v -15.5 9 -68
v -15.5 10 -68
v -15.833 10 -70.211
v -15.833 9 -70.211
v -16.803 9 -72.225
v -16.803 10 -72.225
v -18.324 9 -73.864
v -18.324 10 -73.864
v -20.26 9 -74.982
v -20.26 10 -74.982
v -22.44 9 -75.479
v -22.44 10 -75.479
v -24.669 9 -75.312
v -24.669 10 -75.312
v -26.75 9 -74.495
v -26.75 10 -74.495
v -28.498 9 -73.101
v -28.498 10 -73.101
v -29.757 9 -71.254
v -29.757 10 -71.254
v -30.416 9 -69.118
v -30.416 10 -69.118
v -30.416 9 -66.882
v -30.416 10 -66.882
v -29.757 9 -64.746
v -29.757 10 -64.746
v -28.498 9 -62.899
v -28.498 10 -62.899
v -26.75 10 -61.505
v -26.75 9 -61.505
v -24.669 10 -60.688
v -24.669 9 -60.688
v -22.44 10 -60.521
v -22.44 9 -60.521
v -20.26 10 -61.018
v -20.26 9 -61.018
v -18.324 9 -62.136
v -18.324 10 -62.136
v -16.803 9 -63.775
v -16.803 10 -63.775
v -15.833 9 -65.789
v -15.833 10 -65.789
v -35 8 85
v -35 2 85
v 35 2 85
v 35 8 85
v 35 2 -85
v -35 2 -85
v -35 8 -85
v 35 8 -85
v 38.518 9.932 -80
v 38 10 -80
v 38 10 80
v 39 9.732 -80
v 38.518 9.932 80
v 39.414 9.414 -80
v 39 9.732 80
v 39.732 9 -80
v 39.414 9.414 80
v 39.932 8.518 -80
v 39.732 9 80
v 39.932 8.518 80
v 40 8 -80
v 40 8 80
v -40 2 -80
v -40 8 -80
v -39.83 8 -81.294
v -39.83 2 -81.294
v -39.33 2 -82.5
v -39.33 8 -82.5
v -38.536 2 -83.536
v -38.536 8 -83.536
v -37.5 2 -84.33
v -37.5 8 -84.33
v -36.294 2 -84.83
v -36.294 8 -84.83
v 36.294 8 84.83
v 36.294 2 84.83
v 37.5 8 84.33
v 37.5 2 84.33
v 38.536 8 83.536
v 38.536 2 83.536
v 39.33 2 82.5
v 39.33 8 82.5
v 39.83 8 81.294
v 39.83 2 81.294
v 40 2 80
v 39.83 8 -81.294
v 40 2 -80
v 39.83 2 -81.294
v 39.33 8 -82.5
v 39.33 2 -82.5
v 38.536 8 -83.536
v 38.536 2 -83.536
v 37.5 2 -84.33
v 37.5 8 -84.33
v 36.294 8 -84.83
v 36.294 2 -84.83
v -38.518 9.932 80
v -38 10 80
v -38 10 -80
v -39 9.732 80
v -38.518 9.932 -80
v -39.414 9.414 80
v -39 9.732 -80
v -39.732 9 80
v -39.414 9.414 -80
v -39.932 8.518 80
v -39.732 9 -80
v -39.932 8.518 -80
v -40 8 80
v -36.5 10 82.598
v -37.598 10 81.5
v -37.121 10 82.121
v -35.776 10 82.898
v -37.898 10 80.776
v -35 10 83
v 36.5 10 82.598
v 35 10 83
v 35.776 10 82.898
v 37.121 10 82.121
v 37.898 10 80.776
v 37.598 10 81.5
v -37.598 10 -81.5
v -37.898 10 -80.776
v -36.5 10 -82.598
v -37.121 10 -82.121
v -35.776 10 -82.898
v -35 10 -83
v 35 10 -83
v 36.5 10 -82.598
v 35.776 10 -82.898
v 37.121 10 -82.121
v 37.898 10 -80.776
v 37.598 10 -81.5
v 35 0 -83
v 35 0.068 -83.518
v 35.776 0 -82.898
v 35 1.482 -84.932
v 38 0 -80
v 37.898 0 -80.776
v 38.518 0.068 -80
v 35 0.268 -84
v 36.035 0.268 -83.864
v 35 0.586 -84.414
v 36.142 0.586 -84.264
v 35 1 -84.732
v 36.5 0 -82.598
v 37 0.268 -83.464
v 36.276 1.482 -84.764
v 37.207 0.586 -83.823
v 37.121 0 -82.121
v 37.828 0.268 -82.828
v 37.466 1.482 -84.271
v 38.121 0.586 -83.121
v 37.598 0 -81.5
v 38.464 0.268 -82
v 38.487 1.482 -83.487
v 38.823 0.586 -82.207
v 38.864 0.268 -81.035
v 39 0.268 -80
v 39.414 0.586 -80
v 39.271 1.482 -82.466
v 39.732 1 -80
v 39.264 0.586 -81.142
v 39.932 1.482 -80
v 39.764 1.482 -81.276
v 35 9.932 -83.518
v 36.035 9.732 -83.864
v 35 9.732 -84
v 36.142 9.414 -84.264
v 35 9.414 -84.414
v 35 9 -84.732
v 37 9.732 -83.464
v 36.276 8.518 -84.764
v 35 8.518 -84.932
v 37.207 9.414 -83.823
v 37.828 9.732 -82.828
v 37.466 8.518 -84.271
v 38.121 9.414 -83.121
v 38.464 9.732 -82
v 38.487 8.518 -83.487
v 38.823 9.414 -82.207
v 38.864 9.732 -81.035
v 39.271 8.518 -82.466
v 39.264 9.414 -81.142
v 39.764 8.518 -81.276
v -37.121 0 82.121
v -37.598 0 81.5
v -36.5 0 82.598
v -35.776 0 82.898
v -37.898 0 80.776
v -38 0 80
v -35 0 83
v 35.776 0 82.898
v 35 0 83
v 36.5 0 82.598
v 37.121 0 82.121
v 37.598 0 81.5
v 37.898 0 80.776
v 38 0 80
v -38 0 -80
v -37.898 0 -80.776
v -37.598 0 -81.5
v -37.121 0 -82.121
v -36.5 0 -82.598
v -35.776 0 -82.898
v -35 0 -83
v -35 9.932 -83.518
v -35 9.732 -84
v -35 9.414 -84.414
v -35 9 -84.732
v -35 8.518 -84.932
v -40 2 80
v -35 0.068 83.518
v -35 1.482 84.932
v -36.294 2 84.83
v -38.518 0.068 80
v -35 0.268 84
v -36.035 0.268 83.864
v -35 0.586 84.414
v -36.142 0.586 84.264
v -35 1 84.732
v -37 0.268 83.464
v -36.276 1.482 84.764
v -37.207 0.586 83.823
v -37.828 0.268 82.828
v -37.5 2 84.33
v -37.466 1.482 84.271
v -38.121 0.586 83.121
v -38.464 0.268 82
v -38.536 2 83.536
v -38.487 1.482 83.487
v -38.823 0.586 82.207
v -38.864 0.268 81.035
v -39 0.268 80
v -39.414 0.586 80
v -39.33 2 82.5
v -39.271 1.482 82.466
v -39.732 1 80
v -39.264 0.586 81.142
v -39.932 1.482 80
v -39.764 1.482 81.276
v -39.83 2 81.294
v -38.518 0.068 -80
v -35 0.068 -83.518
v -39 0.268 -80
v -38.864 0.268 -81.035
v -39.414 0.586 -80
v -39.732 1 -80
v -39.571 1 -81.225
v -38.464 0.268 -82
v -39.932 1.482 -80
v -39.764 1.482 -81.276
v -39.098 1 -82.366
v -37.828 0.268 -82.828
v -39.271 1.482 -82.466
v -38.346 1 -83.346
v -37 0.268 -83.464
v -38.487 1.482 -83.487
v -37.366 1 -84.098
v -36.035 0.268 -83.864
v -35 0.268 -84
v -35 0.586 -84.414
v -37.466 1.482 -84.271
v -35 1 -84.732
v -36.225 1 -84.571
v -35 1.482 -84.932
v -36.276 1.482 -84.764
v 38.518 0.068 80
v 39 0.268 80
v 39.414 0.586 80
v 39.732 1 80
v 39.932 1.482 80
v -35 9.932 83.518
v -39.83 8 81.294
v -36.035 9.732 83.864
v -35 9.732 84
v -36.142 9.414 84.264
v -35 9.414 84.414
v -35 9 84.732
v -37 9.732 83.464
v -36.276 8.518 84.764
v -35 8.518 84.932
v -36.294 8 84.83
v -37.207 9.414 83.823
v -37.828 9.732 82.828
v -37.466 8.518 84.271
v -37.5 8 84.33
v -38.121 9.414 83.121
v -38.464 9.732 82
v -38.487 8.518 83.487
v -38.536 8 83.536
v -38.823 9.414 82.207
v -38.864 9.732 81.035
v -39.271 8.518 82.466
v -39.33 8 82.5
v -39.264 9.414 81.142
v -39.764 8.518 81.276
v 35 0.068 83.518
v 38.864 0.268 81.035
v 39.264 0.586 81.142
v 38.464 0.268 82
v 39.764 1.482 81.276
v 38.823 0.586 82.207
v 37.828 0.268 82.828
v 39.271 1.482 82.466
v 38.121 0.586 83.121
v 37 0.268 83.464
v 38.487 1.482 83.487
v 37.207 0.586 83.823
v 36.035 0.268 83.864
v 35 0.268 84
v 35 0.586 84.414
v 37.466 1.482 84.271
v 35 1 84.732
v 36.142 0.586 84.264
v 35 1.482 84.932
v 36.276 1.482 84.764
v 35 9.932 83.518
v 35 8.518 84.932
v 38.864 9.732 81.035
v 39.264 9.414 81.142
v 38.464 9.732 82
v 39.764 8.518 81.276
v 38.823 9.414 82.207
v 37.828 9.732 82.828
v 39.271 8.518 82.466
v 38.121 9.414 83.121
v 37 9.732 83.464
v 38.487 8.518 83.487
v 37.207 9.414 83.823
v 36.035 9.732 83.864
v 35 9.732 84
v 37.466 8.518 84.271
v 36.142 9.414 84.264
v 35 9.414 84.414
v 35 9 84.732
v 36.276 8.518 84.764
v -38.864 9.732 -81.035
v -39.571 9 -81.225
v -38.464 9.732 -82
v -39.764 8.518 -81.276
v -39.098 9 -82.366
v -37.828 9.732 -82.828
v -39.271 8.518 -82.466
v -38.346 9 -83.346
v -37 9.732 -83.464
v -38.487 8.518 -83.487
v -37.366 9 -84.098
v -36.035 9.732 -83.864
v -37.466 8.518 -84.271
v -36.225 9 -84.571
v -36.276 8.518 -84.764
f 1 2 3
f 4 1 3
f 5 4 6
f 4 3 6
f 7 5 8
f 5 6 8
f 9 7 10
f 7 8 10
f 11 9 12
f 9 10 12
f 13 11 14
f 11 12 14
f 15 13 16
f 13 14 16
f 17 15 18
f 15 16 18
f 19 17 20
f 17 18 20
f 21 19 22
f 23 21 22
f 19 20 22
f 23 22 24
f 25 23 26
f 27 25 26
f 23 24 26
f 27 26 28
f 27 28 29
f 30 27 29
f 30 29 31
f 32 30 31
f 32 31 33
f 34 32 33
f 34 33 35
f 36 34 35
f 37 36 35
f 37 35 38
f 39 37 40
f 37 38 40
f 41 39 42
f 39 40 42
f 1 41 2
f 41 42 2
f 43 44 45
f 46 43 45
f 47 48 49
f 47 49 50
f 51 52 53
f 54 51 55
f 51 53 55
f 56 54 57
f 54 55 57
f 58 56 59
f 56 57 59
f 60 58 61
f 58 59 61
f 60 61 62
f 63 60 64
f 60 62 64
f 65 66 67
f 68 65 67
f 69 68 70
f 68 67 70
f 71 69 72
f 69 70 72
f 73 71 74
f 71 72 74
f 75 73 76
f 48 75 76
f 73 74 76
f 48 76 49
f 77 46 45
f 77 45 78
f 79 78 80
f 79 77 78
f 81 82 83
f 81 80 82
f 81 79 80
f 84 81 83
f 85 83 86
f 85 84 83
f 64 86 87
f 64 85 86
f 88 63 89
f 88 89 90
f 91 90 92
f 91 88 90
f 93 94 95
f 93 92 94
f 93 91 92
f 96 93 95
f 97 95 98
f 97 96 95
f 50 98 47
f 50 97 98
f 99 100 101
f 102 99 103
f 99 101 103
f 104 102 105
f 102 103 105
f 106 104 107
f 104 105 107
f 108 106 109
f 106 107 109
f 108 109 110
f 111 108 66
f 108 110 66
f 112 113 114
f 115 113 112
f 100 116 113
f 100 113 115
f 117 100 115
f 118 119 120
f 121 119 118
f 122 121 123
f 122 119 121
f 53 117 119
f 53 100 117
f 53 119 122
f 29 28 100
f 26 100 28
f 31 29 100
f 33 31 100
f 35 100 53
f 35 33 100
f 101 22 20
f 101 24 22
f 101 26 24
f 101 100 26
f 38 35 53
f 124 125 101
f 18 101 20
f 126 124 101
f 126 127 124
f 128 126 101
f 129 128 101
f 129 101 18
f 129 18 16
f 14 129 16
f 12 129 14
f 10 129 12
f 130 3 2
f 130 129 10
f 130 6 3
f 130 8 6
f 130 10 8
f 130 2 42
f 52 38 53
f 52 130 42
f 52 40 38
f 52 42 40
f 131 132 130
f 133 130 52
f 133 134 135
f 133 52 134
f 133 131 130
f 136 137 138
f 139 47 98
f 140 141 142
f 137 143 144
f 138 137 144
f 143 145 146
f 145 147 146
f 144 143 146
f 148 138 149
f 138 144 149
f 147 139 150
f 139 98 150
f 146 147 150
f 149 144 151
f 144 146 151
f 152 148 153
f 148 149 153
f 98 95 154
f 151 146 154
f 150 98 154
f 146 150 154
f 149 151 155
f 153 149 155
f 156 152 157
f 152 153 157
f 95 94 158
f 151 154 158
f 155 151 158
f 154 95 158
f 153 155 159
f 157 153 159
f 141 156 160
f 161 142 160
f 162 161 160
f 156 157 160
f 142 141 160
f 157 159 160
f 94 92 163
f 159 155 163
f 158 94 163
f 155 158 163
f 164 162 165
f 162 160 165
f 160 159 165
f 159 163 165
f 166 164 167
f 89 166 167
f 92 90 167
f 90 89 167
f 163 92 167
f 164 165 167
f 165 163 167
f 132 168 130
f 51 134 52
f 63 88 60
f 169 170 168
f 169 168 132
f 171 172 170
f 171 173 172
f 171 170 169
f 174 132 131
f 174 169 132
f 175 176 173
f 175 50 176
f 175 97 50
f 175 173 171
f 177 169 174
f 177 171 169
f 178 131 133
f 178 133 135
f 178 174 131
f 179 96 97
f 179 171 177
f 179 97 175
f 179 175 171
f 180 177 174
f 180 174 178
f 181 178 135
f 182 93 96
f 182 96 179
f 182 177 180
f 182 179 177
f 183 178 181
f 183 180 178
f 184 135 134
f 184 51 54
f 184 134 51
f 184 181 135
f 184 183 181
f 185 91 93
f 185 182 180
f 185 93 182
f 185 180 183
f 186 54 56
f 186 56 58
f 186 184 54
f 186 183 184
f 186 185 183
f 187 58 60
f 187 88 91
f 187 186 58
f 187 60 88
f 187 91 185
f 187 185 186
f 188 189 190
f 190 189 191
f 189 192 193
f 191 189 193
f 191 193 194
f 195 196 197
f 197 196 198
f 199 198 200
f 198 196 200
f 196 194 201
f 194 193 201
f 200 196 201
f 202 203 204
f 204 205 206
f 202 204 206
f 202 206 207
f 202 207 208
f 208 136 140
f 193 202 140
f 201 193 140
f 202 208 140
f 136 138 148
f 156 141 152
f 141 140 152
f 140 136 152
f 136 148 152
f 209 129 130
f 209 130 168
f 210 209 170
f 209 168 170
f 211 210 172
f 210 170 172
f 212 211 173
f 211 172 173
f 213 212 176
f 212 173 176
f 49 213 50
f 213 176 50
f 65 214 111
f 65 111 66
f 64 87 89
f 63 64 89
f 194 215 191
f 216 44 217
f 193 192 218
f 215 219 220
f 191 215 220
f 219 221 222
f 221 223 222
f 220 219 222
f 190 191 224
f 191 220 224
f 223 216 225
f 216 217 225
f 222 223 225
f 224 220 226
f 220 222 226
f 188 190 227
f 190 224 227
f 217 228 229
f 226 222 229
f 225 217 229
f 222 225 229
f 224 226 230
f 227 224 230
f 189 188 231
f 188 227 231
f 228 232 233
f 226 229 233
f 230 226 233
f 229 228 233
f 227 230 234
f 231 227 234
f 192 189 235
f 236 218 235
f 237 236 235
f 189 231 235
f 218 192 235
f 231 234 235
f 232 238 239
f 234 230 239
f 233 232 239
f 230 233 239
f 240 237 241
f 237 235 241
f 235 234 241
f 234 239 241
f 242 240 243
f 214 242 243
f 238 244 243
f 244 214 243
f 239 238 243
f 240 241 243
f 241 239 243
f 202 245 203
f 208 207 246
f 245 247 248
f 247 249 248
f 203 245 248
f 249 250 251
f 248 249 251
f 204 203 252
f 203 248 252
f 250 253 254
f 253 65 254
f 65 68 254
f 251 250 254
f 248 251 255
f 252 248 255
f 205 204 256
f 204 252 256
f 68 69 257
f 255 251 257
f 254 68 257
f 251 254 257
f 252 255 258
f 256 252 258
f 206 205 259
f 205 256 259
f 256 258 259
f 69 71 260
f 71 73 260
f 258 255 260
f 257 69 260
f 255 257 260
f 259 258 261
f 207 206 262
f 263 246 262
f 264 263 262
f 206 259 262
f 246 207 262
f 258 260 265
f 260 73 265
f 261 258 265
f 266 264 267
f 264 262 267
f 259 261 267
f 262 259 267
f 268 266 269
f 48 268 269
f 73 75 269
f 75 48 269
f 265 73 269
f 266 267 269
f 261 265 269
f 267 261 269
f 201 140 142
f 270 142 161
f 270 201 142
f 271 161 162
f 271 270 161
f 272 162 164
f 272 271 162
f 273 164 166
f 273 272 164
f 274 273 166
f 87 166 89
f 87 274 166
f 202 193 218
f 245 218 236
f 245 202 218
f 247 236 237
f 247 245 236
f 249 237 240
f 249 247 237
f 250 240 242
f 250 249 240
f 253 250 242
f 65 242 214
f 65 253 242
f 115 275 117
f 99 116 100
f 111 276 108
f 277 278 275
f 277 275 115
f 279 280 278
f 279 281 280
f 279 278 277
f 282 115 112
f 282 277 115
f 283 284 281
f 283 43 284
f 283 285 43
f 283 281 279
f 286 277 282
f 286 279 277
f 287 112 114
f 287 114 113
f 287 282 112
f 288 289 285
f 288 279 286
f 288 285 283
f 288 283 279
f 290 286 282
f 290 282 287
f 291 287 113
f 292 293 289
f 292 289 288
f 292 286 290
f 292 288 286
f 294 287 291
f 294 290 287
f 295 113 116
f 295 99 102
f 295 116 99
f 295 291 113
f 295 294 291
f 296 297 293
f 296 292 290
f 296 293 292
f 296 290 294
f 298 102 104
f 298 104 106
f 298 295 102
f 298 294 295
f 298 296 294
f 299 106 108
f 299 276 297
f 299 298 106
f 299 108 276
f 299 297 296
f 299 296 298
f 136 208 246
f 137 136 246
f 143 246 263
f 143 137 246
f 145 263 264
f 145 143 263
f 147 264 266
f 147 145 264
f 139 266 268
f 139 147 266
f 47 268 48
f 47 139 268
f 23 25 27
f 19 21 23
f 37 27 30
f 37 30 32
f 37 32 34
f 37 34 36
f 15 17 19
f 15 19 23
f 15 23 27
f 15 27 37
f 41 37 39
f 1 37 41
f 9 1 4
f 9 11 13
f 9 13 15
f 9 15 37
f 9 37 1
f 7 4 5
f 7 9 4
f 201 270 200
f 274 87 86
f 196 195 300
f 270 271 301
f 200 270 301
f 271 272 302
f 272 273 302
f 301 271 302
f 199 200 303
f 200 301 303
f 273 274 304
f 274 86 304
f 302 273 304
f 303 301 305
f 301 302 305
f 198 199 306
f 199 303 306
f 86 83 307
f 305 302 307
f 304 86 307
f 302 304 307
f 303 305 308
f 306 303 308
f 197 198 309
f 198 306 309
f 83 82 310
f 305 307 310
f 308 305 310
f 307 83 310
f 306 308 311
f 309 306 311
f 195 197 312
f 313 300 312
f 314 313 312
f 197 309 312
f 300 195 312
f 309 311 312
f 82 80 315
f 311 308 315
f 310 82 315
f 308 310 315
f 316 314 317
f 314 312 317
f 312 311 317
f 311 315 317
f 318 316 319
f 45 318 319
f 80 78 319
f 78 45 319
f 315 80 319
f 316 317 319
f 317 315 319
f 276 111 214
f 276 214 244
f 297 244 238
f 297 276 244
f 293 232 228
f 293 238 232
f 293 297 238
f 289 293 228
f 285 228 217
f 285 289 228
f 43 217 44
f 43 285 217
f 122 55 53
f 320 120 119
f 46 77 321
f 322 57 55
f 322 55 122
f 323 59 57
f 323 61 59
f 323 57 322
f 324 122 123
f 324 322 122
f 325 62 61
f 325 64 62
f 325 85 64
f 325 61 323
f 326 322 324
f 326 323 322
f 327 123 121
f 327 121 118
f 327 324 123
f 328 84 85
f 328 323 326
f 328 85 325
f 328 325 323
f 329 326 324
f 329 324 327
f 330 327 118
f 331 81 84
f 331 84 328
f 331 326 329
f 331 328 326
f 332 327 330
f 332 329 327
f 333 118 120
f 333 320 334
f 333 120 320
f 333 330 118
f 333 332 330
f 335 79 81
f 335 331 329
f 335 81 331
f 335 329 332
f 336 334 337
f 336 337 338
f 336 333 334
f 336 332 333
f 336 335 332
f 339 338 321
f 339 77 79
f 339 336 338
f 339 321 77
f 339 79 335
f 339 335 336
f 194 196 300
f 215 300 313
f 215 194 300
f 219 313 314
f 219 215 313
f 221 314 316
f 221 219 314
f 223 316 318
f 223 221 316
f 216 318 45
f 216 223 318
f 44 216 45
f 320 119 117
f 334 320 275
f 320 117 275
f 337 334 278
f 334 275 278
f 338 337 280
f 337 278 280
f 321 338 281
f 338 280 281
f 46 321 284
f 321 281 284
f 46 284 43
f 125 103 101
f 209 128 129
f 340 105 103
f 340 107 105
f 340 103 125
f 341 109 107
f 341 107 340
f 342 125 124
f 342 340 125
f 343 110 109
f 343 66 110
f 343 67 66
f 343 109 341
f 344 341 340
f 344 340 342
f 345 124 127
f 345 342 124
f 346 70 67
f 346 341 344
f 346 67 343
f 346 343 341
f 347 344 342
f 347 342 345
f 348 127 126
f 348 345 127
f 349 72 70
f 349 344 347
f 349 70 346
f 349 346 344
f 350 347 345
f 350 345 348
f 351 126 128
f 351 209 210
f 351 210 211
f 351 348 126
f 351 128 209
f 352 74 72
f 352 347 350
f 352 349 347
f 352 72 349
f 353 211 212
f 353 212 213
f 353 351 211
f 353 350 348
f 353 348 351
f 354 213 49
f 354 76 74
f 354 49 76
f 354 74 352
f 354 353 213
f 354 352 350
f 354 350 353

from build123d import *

# Parameters (mm, degrees)
SKETCH1_W           = 80
SKETCH1_H           = 170
BOSS_EXTRUDE1_DEPTH = 10
FILLET4_R           = 5
FILLET5_R           = 2
SKETCH3_R           = 7.5
CUT_EXTRUDE1_DEPTH  = 1


with BuildPart() as part:
    # Sketch1 → Boss-Extrude1 (new body)
    with BuildSketch(Plane(origin=(0, 0, 0), x_dir=(1, 0, 0), z_dir=(0, 1, 0))):
        Rectangle(SKETCH1_W, SKETCH1_H)
    extrude(amount=BOSS_EXTRUDE1_DEPTH)

    # Fillet4
    fillet4_edges = [part.edges().sort_by_distance(p)[0] for p in [
        (40, 5, 85),
        (-40, 5, 85),
        (-40, 5, -85),
        (40, 5, -85),
    ]]
    fillet(fillet4_edges, radius=FILLET4_R)

    # Fillet5
    fillet5_edges = [part.edges().sort_by_distance(p)[0] for p in [
        (0, 0, -85),
        (0, 10, -85),
        (40, 0, 0),
        (0, 0, 85),
        (-40, 0, 0),
        (38.535533906, 0, 83.535533906),
        (-38.535533906, 0, 83.535533906),
        (-38.535533906, 0, -83.535533906),
        (38.535533906, 0, -83.535533906),
        (40, 10, 0),
        (-40, 10, 0),
        (0, 10, 85),
        (38.535533906, 10, 83.535533906),
        (-38.535533906, 10, 83.535533906),
        (-38.535533906, 10, -83.535533906),
        (38.535533906, 10, -83.535533906),
    ]]
    fillet(fillet5_edges, radius=FILLET5_R)

    # Sketch3 → Cut-Extrude1 (cut)
    with BuildSketch(Plane(origin=(0, 10, 0), x_dir=(1, 0, 0), z_dir=(0, 1, 0))):
        with Locations((-23, 68)):
            Circle(SKETCH3_R)
    extrude(amount=-CUT_EXTRUDE1_DEPTH, mode=Mode.SUBTRACT)


solid = part.part
